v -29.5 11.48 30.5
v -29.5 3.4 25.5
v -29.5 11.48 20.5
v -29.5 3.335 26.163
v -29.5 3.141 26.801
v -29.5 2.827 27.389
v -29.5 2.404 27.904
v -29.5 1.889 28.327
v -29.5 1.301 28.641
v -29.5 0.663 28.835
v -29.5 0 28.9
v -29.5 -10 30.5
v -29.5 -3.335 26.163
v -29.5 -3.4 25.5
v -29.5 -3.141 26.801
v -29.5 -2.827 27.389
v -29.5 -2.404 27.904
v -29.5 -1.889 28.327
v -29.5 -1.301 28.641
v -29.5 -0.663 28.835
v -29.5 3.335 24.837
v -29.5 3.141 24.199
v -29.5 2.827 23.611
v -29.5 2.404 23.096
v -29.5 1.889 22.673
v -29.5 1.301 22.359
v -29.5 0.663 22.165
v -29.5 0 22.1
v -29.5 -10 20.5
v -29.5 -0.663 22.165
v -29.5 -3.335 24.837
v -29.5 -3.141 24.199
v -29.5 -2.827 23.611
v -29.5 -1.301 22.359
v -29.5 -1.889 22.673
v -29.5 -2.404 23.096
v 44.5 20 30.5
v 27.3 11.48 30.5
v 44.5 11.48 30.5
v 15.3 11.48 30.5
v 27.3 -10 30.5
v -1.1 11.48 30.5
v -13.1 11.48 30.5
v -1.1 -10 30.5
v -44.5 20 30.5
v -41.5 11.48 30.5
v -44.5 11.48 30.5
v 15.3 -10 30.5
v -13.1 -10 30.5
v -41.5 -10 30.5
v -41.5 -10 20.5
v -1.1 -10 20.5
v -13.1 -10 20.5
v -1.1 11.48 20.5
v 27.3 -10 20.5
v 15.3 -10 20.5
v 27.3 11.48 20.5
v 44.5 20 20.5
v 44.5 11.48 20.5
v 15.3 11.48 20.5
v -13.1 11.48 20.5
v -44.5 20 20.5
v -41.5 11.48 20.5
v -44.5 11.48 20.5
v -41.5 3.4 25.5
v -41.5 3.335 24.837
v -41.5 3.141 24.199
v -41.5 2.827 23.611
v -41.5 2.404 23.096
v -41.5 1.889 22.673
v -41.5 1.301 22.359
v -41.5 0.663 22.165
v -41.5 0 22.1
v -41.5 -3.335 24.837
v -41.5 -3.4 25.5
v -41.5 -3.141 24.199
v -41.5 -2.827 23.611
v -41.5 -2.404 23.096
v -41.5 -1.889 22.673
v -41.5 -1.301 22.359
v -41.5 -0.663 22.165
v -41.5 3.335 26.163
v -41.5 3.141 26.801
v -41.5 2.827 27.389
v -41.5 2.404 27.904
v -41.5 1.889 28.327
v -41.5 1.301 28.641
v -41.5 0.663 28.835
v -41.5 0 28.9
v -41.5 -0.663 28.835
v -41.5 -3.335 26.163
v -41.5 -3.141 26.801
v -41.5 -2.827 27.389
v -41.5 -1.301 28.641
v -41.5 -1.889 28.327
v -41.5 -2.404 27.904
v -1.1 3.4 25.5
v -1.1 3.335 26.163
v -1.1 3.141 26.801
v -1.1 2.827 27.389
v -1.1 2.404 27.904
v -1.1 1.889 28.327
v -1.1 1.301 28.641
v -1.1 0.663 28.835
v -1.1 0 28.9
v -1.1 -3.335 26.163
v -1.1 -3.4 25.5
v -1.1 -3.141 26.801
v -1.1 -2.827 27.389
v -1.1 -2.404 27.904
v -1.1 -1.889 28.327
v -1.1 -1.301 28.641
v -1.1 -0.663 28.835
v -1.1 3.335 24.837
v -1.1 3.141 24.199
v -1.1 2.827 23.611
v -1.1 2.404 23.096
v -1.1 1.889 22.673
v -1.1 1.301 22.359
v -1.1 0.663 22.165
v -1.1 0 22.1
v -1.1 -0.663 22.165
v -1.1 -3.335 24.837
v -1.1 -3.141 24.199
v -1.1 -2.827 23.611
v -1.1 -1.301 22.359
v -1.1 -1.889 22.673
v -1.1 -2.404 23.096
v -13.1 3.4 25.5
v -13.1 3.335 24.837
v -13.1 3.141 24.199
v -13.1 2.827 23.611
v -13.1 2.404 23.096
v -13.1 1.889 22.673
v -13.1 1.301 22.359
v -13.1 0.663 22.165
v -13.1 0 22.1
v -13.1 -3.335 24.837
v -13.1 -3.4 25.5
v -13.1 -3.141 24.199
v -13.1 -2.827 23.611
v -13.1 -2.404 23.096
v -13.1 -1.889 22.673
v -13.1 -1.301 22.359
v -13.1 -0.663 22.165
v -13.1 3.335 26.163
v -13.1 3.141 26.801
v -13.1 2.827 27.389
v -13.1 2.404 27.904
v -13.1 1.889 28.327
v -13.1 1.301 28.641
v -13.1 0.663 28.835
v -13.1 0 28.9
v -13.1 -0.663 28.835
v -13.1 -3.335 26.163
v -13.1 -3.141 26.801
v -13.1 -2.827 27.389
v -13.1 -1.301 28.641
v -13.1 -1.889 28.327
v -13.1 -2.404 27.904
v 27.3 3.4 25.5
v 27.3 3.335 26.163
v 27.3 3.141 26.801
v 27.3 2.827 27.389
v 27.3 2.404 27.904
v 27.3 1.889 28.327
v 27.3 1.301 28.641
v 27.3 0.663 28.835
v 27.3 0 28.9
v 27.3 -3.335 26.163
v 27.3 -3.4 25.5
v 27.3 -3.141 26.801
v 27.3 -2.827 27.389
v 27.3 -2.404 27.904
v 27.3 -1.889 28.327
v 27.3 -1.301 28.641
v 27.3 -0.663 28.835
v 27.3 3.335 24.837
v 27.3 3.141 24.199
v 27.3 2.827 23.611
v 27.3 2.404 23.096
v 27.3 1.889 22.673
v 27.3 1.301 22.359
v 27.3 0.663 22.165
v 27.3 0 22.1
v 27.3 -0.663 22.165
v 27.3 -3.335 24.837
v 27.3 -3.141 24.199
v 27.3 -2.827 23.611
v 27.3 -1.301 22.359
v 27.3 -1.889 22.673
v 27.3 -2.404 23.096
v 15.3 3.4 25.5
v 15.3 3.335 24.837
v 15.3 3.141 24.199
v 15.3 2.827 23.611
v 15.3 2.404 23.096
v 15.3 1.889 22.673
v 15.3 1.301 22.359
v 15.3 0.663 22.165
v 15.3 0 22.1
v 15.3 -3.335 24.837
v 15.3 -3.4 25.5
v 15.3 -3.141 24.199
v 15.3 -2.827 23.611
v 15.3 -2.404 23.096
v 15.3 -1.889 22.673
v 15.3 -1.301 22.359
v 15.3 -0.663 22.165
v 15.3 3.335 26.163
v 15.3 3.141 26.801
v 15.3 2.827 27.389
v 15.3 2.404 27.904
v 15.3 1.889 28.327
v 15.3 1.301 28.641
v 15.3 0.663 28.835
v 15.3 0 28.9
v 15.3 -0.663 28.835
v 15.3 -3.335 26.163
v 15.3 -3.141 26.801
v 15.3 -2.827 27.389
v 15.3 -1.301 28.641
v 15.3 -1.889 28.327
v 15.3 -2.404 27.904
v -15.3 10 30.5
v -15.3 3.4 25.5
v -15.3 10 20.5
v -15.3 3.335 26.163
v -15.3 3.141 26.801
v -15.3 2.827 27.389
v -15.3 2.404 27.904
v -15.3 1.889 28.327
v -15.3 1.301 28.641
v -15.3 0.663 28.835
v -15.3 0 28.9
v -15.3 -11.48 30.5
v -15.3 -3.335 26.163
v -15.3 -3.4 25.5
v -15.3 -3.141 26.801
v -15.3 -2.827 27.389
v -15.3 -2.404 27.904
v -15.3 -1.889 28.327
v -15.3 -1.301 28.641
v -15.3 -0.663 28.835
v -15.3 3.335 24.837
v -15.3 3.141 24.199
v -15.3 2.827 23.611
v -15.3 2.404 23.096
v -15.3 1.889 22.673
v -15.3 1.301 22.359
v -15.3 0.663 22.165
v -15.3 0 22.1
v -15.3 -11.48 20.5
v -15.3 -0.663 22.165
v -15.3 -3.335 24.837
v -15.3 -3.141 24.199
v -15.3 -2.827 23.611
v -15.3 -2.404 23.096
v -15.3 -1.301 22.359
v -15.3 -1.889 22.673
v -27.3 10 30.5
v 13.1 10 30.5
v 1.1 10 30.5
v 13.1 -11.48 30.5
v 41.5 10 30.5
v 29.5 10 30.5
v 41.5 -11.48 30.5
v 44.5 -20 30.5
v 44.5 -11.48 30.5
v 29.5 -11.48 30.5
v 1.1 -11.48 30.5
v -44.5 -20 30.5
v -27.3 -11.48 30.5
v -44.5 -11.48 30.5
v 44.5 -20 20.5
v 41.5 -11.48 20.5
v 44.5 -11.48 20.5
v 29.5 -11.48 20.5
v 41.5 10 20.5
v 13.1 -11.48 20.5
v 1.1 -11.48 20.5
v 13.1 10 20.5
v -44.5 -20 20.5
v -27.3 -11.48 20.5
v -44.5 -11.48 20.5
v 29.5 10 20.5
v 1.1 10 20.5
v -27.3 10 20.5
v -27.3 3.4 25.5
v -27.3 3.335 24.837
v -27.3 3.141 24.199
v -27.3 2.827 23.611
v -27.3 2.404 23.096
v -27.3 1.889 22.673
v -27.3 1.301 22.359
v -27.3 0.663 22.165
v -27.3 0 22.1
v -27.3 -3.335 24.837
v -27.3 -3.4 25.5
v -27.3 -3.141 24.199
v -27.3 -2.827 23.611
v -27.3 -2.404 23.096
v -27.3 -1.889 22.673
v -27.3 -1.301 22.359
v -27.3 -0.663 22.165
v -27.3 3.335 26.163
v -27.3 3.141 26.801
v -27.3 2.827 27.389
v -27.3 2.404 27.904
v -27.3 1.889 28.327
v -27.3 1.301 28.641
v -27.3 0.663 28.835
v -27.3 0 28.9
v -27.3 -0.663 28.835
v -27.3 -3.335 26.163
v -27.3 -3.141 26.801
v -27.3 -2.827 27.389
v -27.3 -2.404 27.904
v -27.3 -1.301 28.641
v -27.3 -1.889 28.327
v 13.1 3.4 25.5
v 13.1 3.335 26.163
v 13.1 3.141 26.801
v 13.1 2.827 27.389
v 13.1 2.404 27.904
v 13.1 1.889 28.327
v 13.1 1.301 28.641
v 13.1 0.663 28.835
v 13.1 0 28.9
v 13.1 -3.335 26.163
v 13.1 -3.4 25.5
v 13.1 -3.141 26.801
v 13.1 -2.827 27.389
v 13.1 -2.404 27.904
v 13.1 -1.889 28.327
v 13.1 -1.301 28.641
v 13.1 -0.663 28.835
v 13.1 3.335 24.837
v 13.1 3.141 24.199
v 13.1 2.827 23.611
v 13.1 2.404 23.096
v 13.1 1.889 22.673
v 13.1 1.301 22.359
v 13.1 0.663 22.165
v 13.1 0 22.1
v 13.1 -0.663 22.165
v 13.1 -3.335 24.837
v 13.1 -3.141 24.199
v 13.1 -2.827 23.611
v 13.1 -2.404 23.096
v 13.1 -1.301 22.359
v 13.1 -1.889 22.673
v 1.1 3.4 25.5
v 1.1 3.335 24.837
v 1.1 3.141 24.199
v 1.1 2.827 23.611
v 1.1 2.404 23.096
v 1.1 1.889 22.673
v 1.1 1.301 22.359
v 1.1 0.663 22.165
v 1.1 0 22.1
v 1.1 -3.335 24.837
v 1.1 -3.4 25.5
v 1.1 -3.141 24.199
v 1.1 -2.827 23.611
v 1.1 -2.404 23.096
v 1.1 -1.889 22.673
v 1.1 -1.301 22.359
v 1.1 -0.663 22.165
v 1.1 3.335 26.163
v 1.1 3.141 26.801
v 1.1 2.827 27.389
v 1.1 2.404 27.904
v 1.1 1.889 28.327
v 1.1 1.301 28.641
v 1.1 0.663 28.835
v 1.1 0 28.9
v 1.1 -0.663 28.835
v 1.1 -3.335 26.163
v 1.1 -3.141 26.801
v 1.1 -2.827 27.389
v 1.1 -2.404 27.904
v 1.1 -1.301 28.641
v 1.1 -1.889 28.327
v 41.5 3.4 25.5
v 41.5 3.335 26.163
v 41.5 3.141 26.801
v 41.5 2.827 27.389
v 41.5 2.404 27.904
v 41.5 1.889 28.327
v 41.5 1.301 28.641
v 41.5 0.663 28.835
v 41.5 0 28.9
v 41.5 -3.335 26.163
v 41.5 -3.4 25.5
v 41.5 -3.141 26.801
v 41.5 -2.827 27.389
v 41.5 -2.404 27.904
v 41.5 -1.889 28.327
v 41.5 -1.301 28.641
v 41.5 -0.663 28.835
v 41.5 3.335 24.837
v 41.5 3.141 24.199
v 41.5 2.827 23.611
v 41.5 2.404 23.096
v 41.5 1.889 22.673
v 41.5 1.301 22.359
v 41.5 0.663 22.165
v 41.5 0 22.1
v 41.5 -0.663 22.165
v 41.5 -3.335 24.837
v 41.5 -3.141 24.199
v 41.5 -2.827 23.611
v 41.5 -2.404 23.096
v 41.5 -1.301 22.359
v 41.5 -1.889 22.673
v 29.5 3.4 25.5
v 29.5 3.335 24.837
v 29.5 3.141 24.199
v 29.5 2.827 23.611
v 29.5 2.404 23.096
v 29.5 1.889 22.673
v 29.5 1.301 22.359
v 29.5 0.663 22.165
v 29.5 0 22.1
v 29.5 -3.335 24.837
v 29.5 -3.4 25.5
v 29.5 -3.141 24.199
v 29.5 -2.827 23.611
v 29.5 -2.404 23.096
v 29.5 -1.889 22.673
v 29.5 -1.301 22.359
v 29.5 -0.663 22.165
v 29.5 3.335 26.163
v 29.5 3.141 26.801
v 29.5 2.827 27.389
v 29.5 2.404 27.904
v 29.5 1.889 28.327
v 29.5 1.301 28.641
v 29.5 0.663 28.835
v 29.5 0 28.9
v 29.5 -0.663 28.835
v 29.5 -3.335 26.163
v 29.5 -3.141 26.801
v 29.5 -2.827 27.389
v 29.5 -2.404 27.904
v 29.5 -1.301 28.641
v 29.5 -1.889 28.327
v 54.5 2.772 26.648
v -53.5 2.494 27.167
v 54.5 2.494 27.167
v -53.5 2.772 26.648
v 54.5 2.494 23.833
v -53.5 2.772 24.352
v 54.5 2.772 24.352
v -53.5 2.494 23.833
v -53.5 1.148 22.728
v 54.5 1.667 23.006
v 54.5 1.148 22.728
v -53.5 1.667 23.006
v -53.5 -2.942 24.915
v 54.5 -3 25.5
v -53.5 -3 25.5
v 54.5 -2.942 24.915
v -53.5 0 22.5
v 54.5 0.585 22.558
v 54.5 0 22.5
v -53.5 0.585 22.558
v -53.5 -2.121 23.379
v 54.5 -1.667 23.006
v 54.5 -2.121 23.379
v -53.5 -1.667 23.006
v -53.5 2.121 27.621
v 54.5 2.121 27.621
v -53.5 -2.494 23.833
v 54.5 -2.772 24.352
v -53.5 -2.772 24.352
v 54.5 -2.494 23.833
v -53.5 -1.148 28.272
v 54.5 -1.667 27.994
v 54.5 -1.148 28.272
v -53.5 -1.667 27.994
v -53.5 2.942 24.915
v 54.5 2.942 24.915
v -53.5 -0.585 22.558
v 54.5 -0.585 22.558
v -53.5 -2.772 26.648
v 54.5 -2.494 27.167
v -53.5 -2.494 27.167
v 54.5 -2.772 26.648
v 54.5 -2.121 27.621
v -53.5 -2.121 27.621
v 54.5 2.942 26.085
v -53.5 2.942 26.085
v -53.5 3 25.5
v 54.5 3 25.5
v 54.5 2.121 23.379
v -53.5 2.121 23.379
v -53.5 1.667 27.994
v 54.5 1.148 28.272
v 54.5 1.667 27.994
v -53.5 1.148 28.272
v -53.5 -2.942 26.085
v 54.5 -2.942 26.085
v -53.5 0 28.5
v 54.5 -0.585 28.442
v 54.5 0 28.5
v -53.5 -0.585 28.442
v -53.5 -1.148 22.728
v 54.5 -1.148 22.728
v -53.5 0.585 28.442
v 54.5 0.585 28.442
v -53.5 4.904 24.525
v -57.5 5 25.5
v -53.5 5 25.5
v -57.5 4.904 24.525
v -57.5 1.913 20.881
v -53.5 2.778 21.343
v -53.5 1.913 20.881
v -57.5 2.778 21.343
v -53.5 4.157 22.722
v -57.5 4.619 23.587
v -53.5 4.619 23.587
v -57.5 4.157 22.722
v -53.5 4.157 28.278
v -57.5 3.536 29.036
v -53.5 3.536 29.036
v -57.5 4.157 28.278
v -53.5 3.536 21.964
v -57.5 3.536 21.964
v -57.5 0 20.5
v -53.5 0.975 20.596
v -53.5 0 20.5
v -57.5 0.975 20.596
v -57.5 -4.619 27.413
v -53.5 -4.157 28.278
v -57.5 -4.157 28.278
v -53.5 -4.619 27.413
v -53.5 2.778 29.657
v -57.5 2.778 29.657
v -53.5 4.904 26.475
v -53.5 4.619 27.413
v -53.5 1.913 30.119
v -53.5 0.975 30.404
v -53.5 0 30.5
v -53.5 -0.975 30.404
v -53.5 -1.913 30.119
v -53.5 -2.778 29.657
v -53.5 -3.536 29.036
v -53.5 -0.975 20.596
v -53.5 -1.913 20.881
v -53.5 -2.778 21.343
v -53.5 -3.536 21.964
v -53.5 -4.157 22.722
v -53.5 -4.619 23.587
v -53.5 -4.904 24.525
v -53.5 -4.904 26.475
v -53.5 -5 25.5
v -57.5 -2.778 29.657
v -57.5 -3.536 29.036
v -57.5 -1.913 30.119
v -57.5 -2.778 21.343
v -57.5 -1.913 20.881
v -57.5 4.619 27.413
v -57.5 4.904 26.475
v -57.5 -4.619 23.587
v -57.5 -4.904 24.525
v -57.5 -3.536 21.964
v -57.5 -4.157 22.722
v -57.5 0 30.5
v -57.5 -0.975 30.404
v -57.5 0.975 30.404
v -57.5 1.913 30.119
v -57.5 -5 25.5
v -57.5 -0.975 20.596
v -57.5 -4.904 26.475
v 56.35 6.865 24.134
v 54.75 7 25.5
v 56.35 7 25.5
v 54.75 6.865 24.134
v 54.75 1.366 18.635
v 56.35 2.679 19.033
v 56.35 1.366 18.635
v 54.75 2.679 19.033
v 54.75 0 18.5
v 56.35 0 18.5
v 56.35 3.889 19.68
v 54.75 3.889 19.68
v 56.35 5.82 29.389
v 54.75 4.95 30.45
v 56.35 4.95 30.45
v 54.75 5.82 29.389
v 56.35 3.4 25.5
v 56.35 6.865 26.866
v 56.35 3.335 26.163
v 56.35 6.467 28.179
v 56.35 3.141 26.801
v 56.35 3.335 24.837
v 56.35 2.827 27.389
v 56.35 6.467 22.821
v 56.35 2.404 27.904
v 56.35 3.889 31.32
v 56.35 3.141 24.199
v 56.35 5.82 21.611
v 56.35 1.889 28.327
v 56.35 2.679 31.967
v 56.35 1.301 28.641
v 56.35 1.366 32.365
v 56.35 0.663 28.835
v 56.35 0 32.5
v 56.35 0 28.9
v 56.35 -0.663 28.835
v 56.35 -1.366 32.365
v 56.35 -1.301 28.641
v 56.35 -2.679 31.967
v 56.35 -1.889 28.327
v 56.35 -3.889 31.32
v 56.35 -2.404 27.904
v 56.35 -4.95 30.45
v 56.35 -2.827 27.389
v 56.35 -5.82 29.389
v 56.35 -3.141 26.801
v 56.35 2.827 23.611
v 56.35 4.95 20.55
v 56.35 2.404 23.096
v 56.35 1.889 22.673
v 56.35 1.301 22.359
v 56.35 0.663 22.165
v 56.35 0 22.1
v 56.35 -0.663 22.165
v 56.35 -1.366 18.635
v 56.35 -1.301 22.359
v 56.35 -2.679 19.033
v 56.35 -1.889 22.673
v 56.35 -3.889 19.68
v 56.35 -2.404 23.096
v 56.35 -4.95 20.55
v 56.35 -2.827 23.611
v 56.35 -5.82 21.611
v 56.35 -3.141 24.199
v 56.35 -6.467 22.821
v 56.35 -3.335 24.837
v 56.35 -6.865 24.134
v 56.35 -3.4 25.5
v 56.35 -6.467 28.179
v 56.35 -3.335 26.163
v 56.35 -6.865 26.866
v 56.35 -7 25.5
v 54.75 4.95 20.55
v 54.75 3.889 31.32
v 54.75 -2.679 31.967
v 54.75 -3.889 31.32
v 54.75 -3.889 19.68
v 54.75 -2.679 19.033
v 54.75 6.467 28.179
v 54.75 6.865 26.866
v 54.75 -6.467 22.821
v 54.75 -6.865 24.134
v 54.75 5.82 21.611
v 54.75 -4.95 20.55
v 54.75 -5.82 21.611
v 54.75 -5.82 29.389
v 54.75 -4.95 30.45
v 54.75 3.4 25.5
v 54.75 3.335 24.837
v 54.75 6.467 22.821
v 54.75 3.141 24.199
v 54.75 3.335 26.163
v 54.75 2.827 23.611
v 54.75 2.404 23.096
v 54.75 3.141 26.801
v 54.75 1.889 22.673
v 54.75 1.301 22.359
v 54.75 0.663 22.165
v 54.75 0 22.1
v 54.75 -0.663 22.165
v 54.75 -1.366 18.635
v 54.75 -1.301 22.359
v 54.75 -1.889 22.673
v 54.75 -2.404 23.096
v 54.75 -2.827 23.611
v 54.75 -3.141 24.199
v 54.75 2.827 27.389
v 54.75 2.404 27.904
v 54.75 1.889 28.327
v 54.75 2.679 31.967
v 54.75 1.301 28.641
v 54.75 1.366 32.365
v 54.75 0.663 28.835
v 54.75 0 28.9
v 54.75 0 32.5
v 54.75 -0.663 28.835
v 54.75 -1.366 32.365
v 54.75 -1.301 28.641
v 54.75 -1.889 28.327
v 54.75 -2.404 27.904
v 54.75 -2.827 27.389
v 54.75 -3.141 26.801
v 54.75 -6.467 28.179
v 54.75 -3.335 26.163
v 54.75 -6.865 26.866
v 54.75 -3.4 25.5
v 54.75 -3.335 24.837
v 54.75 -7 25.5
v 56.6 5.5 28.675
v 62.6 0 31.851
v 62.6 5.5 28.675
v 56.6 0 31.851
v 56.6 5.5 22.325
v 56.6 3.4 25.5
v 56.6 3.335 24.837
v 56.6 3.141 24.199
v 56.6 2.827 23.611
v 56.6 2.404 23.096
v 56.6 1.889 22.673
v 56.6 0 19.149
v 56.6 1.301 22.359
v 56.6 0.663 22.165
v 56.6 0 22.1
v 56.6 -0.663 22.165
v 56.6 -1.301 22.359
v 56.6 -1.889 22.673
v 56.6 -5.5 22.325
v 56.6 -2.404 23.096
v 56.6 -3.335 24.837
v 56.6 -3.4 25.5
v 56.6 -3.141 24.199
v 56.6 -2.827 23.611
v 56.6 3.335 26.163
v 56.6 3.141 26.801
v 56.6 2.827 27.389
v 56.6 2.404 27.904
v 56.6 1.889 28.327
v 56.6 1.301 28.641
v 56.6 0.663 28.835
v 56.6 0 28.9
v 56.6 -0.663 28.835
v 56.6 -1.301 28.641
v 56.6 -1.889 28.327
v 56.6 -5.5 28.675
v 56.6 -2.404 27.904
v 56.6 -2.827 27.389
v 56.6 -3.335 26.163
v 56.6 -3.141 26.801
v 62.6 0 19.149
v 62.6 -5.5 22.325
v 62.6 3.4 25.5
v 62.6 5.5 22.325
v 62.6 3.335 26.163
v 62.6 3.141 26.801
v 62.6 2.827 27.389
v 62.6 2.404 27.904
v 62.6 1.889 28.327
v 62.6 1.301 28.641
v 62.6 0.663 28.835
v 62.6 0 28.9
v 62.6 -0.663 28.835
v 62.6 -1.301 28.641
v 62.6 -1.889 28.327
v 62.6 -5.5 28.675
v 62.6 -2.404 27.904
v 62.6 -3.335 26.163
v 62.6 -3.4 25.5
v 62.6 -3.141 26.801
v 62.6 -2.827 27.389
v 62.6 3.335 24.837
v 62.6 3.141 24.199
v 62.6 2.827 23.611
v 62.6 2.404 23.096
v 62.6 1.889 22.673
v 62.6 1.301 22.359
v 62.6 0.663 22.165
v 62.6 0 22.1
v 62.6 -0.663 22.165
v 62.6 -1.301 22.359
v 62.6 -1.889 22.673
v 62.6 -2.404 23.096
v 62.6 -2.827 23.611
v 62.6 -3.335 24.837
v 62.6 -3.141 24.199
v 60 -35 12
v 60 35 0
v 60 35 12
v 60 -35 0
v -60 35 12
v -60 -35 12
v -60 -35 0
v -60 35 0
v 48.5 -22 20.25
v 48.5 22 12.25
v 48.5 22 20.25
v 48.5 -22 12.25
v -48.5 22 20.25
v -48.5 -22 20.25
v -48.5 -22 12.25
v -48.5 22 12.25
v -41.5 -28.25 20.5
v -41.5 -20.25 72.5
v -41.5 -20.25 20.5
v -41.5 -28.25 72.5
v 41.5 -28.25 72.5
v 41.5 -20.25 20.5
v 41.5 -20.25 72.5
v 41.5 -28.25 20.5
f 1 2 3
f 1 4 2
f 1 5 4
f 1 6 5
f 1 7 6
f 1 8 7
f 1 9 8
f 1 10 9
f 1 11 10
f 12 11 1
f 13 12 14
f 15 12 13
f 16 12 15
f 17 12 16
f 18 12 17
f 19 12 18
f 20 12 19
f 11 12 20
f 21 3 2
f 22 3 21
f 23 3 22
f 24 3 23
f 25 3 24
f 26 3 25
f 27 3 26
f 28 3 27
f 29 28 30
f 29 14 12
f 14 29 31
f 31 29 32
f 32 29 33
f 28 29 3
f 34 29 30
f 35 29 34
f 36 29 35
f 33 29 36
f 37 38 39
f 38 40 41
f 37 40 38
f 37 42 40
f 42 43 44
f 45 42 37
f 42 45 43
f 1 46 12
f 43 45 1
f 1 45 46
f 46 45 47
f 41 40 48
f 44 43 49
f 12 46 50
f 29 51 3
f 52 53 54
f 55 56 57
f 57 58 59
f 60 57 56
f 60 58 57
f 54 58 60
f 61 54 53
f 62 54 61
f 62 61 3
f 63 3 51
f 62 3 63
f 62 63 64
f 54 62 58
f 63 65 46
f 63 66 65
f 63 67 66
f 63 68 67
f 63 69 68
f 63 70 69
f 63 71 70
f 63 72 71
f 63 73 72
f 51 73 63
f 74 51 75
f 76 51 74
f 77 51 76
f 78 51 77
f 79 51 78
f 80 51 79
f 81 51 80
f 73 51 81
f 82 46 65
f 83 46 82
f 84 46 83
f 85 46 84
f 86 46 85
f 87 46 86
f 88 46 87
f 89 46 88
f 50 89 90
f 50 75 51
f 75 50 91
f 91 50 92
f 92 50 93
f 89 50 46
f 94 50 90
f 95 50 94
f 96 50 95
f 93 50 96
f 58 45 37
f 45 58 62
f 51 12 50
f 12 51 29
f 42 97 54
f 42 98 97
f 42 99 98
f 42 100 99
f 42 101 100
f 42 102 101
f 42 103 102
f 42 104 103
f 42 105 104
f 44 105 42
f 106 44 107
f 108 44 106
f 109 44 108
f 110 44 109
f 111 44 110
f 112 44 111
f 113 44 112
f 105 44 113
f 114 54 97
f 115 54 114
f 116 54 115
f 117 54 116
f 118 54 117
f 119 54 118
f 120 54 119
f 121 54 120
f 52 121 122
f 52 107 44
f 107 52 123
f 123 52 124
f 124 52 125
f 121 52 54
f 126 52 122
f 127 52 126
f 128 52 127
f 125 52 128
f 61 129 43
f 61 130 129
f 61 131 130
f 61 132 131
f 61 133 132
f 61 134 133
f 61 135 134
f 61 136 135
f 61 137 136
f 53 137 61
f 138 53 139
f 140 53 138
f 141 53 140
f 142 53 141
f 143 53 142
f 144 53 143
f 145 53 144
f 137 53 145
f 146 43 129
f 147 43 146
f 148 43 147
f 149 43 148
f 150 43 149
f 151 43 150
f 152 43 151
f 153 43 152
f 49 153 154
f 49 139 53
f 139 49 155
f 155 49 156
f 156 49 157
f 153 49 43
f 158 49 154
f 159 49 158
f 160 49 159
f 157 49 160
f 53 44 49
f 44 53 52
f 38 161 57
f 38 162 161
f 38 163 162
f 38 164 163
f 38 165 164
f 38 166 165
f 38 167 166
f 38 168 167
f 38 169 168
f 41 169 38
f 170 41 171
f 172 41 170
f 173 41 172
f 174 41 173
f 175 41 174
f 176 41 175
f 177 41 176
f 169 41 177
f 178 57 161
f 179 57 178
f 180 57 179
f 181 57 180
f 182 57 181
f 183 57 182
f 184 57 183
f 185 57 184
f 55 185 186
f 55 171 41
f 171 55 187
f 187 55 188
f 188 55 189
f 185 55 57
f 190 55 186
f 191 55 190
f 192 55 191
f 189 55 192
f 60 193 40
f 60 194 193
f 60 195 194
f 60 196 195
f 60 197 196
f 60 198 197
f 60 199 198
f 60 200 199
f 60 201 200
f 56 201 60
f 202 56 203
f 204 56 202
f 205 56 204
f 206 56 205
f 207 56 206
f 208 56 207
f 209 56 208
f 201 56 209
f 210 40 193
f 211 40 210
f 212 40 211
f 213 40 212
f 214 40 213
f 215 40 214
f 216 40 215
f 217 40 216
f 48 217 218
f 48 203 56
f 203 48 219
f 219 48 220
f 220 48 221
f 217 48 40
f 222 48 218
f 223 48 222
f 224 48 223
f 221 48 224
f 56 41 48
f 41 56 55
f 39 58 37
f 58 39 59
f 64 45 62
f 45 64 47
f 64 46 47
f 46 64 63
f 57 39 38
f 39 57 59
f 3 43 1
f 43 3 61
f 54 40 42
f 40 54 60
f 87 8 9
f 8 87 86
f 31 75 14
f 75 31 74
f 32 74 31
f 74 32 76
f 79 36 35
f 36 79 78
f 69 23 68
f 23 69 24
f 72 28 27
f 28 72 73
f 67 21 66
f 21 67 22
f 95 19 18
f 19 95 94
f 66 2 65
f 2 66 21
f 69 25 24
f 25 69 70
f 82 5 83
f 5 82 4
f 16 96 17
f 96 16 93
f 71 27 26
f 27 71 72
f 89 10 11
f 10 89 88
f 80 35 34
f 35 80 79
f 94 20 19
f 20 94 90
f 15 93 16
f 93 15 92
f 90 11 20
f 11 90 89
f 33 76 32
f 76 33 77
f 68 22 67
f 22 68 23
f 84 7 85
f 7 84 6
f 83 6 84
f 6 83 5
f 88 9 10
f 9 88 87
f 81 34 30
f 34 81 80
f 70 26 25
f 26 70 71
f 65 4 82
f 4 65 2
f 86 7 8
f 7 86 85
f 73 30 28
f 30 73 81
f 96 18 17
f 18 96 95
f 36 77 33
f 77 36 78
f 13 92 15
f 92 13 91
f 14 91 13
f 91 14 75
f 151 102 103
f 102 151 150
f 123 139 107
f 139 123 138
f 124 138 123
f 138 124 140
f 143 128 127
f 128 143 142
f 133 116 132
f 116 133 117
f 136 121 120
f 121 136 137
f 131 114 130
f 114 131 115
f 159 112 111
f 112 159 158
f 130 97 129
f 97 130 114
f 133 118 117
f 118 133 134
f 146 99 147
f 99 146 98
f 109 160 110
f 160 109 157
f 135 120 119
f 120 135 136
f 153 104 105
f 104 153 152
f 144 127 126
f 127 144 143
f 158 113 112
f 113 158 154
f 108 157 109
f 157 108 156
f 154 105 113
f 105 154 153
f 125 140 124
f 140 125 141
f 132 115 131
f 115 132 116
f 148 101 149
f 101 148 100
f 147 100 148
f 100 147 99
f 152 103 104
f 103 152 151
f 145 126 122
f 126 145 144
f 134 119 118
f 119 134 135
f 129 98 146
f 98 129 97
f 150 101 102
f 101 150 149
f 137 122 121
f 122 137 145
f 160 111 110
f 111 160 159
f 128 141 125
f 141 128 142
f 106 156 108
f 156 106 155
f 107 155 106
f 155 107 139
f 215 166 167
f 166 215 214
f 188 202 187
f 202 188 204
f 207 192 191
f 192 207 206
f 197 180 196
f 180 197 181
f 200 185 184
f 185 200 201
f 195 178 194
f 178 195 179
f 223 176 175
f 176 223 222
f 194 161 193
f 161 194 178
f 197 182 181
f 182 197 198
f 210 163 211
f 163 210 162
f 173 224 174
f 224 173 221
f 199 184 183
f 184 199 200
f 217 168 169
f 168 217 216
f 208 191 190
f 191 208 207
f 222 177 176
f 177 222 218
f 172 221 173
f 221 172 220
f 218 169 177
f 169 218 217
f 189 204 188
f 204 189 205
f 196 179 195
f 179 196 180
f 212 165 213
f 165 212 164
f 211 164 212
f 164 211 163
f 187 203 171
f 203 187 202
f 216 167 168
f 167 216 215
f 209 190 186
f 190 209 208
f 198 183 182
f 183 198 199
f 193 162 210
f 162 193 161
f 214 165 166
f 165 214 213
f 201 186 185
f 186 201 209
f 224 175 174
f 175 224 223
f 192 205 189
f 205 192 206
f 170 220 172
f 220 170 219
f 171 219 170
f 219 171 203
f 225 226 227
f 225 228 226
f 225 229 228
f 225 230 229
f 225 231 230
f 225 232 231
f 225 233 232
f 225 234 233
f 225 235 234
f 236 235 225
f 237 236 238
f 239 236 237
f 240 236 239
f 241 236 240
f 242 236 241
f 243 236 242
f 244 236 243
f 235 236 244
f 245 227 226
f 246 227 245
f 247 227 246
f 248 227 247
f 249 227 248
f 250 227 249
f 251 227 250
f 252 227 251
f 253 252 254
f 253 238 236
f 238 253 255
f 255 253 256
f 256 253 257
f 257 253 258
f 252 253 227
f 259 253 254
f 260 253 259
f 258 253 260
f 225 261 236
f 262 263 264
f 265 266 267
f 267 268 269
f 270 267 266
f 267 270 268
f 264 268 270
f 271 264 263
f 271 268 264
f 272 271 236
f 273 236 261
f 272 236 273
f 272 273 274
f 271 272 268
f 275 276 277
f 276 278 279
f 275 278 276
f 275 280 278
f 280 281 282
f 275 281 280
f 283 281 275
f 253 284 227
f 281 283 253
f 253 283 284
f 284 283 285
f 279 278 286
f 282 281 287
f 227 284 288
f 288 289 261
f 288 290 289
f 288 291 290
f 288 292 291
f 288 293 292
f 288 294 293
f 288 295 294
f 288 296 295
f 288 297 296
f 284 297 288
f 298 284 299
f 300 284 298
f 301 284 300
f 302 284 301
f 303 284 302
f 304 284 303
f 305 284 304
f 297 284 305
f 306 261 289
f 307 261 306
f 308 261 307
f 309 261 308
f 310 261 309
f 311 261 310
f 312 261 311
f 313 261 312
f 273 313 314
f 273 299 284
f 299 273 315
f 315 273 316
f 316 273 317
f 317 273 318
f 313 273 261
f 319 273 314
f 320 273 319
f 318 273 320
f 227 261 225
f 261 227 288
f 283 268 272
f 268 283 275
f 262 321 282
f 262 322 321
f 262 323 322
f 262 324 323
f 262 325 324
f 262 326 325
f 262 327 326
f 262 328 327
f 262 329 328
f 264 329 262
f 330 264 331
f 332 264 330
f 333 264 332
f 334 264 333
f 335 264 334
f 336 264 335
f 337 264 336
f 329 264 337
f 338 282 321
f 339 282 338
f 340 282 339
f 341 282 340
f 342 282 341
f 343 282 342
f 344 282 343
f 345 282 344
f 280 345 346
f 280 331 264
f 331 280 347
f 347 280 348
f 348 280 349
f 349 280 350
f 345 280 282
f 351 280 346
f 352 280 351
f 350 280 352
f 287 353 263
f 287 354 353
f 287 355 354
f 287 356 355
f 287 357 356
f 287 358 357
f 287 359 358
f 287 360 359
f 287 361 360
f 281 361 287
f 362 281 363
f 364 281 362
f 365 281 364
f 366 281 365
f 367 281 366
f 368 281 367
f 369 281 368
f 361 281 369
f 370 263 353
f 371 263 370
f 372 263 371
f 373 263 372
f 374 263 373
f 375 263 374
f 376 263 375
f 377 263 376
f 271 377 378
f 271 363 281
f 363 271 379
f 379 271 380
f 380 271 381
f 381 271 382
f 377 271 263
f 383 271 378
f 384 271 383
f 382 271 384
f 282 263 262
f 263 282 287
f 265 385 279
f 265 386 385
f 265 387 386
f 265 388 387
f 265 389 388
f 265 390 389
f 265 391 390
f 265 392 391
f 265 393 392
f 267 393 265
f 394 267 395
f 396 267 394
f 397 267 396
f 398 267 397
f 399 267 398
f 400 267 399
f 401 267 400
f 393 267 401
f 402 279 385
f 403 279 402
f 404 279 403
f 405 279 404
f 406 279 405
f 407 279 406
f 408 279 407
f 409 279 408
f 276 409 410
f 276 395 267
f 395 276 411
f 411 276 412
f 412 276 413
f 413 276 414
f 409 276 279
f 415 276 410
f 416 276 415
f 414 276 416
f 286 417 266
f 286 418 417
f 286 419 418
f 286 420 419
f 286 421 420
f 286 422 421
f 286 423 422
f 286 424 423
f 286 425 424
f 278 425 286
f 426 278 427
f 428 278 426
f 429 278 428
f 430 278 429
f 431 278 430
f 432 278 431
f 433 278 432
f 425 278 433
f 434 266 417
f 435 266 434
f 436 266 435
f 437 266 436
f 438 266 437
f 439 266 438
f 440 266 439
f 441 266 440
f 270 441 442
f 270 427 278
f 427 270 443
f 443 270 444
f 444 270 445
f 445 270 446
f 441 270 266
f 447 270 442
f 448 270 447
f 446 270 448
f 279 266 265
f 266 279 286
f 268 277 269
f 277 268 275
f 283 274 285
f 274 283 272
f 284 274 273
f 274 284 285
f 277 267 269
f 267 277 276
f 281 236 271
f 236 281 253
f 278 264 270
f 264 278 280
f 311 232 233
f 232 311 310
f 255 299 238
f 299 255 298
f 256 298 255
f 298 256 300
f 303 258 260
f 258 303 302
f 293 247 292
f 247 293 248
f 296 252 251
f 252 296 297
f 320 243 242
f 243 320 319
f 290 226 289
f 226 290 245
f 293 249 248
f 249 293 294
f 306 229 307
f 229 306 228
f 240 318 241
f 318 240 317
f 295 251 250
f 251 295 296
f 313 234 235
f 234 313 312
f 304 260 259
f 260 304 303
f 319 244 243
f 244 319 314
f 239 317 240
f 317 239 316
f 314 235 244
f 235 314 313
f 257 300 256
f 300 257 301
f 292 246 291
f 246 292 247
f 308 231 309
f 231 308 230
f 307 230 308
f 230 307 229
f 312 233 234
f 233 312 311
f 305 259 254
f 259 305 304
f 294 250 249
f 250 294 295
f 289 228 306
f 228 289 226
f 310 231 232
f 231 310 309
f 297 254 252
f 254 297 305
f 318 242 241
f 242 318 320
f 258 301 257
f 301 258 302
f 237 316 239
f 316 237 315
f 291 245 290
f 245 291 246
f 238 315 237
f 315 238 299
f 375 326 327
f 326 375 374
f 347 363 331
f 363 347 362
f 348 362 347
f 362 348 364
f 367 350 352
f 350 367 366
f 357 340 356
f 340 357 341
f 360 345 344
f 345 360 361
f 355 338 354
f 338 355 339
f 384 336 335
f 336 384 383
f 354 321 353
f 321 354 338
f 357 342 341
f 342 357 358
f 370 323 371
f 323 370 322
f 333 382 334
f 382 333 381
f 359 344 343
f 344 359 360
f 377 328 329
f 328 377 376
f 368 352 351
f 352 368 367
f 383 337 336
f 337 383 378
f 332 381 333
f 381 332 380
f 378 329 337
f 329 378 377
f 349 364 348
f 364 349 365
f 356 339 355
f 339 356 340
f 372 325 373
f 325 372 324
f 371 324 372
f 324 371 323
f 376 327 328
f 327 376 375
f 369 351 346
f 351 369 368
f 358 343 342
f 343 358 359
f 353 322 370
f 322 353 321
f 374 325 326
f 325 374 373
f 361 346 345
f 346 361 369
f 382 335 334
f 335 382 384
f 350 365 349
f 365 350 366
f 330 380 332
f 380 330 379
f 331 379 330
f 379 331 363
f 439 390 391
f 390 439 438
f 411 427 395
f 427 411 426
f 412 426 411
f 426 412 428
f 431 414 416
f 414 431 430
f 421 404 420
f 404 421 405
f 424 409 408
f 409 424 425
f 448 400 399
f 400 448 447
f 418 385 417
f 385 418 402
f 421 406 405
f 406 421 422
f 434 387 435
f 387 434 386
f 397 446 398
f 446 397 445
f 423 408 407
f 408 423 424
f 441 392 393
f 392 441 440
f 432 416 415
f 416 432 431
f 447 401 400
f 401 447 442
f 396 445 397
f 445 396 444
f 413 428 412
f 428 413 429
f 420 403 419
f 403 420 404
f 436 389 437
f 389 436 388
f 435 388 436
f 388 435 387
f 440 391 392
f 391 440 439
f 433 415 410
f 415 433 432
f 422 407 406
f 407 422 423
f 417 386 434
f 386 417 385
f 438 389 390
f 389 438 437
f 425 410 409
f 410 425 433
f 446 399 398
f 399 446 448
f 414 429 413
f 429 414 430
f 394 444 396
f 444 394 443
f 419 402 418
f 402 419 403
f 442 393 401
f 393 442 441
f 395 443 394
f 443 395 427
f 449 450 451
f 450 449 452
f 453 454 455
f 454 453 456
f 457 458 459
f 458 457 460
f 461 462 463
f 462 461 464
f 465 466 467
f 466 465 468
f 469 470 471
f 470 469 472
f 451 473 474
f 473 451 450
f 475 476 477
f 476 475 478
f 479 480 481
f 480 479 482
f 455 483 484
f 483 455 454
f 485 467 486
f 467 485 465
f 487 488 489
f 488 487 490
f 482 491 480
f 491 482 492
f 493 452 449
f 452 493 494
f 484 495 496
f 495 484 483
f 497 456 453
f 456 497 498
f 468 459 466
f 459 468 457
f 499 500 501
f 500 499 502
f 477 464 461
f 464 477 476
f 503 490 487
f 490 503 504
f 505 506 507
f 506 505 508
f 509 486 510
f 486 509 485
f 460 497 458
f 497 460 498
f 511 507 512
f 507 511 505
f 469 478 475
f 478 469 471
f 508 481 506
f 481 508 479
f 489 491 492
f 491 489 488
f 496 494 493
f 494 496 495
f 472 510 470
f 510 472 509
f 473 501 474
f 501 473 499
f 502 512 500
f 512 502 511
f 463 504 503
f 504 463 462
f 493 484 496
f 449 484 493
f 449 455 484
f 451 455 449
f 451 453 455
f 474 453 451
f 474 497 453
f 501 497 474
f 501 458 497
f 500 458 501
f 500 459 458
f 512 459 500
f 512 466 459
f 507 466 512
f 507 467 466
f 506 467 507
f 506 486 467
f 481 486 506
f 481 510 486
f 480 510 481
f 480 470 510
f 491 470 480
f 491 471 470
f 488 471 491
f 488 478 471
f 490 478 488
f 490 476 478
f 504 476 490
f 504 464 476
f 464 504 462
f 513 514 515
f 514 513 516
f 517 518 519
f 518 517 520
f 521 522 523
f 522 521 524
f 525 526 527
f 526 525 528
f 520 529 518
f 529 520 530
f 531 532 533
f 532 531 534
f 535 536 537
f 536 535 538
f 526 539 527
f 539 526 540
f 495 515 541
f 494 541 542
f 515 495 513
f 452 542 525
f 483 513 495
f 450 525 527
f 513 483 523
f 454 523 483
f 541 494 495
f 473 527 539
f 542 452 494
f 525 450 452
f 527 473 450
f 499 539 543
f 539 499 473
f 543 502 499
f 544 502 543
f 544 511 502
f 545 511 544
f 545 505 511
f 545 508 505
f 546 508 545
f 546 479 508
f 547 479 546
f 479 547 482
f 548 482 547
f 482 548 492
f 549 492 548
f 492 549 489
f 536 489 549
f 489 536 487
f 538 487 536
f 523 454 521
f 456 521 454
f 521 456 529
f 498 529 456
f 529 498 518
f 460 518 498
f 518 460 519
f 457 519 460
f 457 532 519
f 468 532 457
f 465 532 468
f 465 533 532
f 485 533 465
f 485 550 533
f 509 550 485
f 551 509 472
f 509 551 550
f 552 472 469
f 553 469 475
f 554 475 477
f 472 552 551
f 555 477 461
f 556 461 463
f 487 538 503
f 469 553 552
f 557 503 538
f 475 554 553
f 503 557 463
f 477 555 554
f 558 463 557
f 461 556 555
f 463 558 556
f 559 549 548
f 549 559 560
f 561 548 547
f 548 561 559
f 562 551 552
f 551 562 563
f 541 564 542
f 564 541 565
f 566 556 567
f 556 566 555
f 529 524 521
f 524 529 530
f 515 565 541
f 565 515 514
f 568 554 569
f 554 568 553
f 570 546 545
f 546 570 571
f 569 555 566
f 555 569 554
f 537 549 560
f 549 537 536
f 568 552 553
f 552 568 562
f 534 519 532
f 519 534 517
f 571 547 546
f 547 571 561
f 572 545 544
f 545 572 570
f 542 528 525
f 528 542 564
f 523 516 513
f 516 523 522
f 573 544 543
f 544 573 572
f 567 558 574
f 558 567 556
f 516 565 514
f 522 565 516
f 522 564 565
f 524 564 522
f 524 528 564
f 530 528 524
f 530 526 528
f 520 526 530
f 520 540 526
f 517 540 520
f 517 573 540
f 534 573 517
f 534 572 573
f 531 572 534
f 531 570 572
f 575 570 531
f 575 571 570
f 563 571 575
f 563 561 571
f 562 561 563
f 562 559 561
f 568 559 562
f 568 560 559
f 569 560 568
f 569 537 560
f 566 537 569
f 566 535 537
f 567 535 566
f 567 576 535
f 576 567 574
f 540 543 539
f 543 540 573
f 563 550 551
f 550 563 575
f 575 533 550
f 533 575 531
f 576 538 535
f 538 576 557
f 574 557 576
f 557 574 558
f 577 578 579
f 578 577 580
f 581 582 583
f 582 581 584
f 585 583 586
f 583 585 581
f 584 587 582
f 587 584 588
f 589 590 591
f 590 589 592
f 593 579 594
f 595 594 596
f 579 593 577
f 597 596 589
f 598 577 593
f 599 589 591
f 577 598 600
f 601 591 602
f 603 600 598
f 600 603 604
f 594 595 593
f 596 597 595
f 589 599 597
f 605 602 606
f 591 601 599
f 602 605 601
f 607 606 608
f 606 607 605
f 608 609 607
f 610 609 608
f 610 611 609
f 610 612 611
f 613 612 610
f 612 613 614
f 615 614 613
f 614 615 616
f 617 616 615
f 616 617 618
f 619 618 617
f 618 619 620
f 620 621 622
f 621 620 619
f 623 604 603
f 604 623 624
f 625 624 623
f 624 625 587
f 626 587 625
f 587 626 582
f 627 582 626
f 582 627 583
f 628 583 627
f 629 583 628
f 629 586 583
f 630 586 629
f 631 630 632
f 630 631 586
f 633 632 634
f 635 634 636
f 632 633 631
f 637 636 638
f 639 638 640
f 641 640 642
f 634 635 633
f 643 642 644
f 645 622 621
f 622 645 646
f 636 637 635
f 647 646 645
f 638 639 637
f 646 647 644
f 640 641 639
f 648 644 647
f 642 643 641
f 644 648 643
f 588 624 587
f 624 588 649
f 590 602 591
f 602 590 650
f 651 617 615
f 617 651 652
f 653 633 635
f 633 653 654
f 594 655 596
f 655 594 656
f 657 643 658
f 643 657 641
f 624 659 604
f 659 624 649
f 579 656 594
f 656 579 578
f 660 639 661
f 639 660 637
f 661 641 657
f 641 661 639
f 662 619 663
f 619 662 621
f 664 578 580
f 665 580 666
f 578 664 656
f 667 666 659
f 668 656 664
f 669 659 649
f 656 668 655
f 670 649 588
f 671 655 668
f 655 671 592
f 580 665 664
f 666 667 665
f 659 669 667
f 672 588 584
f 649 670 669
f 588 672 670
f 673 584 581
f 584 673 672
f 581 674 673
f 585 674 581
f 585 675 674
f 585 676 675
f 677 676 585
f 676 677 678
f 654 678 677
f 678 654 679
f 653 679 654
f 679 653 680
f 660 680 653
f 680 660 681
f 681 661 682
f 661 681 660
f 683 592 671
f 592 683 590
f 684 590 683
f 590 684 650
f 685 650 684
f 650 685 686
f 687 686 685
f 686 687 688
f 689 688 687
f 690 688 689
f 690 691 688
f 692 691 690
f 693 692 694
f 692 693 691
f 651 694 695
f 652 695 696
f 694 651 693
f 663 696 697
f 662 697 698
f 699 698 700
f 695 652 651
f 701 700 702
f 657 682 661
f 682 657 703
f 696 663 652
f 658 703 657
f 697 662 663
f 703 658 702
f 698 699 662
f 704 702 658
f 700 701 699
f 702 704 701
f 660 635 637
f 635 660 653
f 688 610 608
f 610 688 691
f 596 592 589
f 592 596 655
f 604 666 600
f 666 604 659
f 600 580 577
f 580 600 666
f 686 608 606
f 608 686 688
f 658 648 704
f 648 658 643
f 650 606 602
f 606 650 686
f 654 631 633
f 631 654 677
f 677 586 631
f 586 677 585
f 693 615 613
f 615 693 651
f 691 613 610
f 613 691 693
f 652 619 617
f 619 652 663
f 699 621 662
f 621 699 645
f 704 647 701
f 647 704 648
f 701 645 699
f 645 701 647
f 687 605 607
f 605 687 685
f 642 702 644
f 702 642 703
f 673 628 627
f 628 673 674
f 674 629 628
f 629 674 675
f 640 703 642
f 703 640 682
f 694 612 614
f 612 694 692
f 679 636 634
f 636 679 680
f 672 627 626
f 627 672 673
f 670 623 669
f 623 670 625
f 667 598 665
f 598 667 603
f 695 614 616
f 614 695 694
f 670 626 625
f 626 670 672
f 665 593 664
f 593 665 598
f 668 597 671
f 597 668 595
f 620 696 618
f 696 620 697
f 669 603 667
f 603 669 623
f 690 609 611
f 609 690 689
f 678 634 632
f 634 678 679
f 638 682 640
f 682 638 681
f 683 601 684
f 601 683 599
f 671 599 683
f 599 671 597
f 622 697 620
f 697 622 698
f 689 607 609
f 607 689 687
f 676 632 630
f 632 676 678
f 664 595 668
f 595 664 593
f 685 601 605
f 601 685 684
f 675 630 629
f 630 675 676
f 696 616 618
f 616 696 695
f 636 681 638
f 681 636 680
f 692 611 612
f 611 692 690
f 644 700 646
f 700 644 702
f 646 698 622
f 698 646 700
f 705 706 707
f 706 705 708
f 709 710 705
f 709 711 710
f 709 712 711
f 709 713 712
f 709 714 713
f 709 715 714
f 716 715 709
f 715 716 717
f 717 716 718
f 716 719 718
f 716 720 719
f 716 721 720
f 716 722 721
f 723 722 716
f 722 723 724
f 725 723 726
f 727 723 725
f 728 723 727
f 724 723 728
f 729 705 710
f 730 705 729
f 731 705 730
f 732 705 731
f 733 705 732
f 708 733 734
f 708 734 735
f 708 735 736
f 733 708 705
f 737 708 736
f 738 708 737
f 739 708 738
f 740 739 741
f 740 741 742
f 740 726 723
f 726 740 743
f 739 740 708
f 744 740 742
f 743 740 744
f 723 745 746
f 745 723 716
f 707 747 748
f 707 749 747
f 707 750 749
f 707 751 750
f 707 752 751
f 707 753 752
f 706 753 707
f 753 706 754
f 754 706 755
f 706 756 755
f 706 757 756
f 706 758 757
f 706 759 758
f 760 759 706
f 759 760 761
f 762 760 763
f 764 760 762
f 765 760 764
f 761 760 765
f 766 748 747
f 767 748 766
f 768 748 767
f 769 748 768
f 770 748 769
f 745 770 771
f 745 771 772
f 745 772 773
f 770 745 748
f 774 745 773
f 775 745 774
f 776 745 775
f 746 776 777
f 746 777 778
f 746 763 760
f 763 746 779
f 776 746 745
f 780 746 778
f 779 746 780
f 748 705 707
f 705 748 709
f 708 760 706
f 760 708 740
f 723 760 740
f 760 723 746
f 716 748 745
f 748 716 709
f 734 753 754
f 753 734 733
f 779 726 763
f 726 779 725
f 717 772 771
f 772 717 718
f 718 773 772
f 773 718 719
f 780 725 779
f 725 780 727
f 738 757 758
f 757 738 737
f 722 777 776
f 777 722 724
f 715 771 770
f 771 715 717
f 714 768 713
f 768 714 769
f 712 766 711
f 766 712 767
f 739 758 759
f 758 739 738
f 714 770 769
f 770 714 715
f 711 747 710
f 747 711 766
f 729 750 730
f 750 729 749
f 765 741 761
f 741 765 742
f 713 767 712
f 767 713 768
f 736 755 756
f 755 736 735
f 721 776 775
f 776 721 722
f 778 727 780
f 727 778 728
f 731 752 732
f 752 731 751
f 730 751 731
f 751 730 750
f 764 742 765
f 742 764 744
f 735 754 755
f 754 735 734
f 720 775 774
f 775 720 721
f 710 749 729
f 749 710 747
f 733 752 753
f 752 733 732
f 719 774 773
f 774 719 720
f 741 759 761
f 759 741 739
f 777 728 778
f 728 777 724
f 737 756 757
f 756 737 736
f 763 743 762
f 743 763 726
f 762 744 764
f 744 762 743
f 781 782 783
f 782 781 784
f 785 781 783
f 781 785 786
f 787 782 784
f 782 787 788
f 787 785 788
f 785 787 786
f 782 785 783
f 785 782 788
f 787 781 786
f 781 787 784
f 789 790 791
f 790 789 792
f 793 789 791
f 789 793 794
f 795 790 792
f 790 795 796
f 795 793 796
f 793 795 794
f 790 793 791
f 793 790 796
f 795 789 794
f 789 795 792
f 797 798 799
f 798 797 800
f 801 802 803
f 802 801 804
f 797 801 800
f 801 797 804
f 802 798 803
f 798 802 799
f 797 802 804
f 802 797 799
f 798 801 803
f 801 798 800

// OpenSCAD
$fn = 32;

// ------------------------------------------------------------------------
// Comb hinge with flap: leaf 89 x 20 mm, pin d6, flap 52 mm
// Every part is its own module, assembly() places every instance.
// ------------------------------------------------------------------------

// --- part 1 ---
module hinge_bed() {
  difference() {
    translate([-60, -35, 0]) cube([120, 70, 12]);
  }
}

// --- part 2 ---
module hinge_riser() {
  difference() {
    translate([-48.5, -22, 0]) cube([97, 44, 8]);
  }
}

// --- part 3 ---
module hinge_leaf_a() {
  difference() {
    union() {
      translate([-41.5, -10, -5]) cube([12, 30, 10]);
      translate([-13.1, -10, -5]) cube([12, 30, 10]);
      translate([15.3, -10, -5]) cube([12, 30, 10]);
      translate([-44.5, 11.48, -5]) cube([89, 8.52, 10]);
    }
    translate([-35.5, 0, 0]) rotate([0, 90, 0]) cylinder(h = 14, d = 6.8, center = true);
    translate([-7.1, 0, 0]) rotate([0, 90, 0]) cylinder(h = 14, d = 6.8, center = true);
    translate([21.3, 0, 0]) rotate([0, 90, 0]) cylinder(h = 14, d = 6.8, center = true);
  }
}

// --- part 4 ---
module hinge_leaf_b() {
  difference() {
    union() {
      translate([-27.3, -20, -5]) cube([12, 30, 10]);
      translate([1.1, -20, -5]) cube([12, 30, 10]);
      translate([29.5, -20, -5]) cube([12, 30, 10]);
      translate([-44.5, -20, -5]) cube([89, 8.52, 10]);
    }
    translate([-21.3, 0, 0]) rotate([0, 90, 0]) cylinder(h = 14, d = 6.8, center = true);
    translate([7.1, 0, 0]) rotate([0, 90, 0]) cylinder(h = 14, d = 6.8, center = true);
    translate([35.5, 0, 0]) rotate([0, 90, 0]) cylinder(h = 14, d = 6.8, center = true);
  }
}

// --- part 5 ---
module hinge_flap() {
  difference() {
    translate([-41.5, -26, 0]) cube([83, 52, 8]);
  }
}

// --- part 6 ---
module hinge_pin() {
  rotate([0, 90, 0]) cylinder(h = 109, d = 6, center = true);
  translate([-57.5, 0, 0]) rotate([0, 90, 0]) cylinder(h = 4, d = 10);
}

// --- part 7 ---
module pin_washer() {
  difference() {
      translate([0, 0, 0]) cylinder(h = 1.6, d = 14);
      translate([0, 0, -1]) cylinder(h = 3.6, d = 6.8);
    }
}

// --- part 8 ---
module pin_nut() {
  difference() {
    linear_extrude(height = 6) polygon(points = [[6.351, 0], [3.175, 5.5], [-3.175, 5.5], [-6.351, 0], [-3.175, -5.5], [3.175, -5.5]]);
    translate([0, 0, -1]) cylinder(h = 8, d = 6.8);
  }
}

// --- assembly ---
module assembly() {
  color([0.80, 0.24, 0.20]) translate([0, 0, 0]) rotate([0, 0, 0]) hinge_bed();
  color([0.20, 0.45, 0.75]) translate([0, 0, 12.25]) rotate([0, 0, 0]) hinge_riser();
  color([0.25, 0.62, 0.32]) translate([0, 0, 25.5]) rotate([0, 0, 0]) hinge_leaf_a();
  color([0.92, 0.70, 0.18]) translate([0, 0, 25.5]) rotate([0, 0, 0]) hinge_leaf_b();
  color([0.58, 0.35, 0.70]) translate([0, -20.25, 46.5]) rotate([90, 0, 0]) hinge_flap();
  color([0.16, 0.66, 0.66]) translate([0, 0, 25.5]) rotate([0, 0, 0]) hinge_pin();
  color([0.85, 0.48, 0.18]) translate([54.75, 0, 25.5]) rotate([0, 90, 0]) pin_washer();
  color([0.55, 0.60, 0.65]) translate([56.6, 0, 25.5]) rotate([0, 90, 0]) pin_nut();
}

assembly();
